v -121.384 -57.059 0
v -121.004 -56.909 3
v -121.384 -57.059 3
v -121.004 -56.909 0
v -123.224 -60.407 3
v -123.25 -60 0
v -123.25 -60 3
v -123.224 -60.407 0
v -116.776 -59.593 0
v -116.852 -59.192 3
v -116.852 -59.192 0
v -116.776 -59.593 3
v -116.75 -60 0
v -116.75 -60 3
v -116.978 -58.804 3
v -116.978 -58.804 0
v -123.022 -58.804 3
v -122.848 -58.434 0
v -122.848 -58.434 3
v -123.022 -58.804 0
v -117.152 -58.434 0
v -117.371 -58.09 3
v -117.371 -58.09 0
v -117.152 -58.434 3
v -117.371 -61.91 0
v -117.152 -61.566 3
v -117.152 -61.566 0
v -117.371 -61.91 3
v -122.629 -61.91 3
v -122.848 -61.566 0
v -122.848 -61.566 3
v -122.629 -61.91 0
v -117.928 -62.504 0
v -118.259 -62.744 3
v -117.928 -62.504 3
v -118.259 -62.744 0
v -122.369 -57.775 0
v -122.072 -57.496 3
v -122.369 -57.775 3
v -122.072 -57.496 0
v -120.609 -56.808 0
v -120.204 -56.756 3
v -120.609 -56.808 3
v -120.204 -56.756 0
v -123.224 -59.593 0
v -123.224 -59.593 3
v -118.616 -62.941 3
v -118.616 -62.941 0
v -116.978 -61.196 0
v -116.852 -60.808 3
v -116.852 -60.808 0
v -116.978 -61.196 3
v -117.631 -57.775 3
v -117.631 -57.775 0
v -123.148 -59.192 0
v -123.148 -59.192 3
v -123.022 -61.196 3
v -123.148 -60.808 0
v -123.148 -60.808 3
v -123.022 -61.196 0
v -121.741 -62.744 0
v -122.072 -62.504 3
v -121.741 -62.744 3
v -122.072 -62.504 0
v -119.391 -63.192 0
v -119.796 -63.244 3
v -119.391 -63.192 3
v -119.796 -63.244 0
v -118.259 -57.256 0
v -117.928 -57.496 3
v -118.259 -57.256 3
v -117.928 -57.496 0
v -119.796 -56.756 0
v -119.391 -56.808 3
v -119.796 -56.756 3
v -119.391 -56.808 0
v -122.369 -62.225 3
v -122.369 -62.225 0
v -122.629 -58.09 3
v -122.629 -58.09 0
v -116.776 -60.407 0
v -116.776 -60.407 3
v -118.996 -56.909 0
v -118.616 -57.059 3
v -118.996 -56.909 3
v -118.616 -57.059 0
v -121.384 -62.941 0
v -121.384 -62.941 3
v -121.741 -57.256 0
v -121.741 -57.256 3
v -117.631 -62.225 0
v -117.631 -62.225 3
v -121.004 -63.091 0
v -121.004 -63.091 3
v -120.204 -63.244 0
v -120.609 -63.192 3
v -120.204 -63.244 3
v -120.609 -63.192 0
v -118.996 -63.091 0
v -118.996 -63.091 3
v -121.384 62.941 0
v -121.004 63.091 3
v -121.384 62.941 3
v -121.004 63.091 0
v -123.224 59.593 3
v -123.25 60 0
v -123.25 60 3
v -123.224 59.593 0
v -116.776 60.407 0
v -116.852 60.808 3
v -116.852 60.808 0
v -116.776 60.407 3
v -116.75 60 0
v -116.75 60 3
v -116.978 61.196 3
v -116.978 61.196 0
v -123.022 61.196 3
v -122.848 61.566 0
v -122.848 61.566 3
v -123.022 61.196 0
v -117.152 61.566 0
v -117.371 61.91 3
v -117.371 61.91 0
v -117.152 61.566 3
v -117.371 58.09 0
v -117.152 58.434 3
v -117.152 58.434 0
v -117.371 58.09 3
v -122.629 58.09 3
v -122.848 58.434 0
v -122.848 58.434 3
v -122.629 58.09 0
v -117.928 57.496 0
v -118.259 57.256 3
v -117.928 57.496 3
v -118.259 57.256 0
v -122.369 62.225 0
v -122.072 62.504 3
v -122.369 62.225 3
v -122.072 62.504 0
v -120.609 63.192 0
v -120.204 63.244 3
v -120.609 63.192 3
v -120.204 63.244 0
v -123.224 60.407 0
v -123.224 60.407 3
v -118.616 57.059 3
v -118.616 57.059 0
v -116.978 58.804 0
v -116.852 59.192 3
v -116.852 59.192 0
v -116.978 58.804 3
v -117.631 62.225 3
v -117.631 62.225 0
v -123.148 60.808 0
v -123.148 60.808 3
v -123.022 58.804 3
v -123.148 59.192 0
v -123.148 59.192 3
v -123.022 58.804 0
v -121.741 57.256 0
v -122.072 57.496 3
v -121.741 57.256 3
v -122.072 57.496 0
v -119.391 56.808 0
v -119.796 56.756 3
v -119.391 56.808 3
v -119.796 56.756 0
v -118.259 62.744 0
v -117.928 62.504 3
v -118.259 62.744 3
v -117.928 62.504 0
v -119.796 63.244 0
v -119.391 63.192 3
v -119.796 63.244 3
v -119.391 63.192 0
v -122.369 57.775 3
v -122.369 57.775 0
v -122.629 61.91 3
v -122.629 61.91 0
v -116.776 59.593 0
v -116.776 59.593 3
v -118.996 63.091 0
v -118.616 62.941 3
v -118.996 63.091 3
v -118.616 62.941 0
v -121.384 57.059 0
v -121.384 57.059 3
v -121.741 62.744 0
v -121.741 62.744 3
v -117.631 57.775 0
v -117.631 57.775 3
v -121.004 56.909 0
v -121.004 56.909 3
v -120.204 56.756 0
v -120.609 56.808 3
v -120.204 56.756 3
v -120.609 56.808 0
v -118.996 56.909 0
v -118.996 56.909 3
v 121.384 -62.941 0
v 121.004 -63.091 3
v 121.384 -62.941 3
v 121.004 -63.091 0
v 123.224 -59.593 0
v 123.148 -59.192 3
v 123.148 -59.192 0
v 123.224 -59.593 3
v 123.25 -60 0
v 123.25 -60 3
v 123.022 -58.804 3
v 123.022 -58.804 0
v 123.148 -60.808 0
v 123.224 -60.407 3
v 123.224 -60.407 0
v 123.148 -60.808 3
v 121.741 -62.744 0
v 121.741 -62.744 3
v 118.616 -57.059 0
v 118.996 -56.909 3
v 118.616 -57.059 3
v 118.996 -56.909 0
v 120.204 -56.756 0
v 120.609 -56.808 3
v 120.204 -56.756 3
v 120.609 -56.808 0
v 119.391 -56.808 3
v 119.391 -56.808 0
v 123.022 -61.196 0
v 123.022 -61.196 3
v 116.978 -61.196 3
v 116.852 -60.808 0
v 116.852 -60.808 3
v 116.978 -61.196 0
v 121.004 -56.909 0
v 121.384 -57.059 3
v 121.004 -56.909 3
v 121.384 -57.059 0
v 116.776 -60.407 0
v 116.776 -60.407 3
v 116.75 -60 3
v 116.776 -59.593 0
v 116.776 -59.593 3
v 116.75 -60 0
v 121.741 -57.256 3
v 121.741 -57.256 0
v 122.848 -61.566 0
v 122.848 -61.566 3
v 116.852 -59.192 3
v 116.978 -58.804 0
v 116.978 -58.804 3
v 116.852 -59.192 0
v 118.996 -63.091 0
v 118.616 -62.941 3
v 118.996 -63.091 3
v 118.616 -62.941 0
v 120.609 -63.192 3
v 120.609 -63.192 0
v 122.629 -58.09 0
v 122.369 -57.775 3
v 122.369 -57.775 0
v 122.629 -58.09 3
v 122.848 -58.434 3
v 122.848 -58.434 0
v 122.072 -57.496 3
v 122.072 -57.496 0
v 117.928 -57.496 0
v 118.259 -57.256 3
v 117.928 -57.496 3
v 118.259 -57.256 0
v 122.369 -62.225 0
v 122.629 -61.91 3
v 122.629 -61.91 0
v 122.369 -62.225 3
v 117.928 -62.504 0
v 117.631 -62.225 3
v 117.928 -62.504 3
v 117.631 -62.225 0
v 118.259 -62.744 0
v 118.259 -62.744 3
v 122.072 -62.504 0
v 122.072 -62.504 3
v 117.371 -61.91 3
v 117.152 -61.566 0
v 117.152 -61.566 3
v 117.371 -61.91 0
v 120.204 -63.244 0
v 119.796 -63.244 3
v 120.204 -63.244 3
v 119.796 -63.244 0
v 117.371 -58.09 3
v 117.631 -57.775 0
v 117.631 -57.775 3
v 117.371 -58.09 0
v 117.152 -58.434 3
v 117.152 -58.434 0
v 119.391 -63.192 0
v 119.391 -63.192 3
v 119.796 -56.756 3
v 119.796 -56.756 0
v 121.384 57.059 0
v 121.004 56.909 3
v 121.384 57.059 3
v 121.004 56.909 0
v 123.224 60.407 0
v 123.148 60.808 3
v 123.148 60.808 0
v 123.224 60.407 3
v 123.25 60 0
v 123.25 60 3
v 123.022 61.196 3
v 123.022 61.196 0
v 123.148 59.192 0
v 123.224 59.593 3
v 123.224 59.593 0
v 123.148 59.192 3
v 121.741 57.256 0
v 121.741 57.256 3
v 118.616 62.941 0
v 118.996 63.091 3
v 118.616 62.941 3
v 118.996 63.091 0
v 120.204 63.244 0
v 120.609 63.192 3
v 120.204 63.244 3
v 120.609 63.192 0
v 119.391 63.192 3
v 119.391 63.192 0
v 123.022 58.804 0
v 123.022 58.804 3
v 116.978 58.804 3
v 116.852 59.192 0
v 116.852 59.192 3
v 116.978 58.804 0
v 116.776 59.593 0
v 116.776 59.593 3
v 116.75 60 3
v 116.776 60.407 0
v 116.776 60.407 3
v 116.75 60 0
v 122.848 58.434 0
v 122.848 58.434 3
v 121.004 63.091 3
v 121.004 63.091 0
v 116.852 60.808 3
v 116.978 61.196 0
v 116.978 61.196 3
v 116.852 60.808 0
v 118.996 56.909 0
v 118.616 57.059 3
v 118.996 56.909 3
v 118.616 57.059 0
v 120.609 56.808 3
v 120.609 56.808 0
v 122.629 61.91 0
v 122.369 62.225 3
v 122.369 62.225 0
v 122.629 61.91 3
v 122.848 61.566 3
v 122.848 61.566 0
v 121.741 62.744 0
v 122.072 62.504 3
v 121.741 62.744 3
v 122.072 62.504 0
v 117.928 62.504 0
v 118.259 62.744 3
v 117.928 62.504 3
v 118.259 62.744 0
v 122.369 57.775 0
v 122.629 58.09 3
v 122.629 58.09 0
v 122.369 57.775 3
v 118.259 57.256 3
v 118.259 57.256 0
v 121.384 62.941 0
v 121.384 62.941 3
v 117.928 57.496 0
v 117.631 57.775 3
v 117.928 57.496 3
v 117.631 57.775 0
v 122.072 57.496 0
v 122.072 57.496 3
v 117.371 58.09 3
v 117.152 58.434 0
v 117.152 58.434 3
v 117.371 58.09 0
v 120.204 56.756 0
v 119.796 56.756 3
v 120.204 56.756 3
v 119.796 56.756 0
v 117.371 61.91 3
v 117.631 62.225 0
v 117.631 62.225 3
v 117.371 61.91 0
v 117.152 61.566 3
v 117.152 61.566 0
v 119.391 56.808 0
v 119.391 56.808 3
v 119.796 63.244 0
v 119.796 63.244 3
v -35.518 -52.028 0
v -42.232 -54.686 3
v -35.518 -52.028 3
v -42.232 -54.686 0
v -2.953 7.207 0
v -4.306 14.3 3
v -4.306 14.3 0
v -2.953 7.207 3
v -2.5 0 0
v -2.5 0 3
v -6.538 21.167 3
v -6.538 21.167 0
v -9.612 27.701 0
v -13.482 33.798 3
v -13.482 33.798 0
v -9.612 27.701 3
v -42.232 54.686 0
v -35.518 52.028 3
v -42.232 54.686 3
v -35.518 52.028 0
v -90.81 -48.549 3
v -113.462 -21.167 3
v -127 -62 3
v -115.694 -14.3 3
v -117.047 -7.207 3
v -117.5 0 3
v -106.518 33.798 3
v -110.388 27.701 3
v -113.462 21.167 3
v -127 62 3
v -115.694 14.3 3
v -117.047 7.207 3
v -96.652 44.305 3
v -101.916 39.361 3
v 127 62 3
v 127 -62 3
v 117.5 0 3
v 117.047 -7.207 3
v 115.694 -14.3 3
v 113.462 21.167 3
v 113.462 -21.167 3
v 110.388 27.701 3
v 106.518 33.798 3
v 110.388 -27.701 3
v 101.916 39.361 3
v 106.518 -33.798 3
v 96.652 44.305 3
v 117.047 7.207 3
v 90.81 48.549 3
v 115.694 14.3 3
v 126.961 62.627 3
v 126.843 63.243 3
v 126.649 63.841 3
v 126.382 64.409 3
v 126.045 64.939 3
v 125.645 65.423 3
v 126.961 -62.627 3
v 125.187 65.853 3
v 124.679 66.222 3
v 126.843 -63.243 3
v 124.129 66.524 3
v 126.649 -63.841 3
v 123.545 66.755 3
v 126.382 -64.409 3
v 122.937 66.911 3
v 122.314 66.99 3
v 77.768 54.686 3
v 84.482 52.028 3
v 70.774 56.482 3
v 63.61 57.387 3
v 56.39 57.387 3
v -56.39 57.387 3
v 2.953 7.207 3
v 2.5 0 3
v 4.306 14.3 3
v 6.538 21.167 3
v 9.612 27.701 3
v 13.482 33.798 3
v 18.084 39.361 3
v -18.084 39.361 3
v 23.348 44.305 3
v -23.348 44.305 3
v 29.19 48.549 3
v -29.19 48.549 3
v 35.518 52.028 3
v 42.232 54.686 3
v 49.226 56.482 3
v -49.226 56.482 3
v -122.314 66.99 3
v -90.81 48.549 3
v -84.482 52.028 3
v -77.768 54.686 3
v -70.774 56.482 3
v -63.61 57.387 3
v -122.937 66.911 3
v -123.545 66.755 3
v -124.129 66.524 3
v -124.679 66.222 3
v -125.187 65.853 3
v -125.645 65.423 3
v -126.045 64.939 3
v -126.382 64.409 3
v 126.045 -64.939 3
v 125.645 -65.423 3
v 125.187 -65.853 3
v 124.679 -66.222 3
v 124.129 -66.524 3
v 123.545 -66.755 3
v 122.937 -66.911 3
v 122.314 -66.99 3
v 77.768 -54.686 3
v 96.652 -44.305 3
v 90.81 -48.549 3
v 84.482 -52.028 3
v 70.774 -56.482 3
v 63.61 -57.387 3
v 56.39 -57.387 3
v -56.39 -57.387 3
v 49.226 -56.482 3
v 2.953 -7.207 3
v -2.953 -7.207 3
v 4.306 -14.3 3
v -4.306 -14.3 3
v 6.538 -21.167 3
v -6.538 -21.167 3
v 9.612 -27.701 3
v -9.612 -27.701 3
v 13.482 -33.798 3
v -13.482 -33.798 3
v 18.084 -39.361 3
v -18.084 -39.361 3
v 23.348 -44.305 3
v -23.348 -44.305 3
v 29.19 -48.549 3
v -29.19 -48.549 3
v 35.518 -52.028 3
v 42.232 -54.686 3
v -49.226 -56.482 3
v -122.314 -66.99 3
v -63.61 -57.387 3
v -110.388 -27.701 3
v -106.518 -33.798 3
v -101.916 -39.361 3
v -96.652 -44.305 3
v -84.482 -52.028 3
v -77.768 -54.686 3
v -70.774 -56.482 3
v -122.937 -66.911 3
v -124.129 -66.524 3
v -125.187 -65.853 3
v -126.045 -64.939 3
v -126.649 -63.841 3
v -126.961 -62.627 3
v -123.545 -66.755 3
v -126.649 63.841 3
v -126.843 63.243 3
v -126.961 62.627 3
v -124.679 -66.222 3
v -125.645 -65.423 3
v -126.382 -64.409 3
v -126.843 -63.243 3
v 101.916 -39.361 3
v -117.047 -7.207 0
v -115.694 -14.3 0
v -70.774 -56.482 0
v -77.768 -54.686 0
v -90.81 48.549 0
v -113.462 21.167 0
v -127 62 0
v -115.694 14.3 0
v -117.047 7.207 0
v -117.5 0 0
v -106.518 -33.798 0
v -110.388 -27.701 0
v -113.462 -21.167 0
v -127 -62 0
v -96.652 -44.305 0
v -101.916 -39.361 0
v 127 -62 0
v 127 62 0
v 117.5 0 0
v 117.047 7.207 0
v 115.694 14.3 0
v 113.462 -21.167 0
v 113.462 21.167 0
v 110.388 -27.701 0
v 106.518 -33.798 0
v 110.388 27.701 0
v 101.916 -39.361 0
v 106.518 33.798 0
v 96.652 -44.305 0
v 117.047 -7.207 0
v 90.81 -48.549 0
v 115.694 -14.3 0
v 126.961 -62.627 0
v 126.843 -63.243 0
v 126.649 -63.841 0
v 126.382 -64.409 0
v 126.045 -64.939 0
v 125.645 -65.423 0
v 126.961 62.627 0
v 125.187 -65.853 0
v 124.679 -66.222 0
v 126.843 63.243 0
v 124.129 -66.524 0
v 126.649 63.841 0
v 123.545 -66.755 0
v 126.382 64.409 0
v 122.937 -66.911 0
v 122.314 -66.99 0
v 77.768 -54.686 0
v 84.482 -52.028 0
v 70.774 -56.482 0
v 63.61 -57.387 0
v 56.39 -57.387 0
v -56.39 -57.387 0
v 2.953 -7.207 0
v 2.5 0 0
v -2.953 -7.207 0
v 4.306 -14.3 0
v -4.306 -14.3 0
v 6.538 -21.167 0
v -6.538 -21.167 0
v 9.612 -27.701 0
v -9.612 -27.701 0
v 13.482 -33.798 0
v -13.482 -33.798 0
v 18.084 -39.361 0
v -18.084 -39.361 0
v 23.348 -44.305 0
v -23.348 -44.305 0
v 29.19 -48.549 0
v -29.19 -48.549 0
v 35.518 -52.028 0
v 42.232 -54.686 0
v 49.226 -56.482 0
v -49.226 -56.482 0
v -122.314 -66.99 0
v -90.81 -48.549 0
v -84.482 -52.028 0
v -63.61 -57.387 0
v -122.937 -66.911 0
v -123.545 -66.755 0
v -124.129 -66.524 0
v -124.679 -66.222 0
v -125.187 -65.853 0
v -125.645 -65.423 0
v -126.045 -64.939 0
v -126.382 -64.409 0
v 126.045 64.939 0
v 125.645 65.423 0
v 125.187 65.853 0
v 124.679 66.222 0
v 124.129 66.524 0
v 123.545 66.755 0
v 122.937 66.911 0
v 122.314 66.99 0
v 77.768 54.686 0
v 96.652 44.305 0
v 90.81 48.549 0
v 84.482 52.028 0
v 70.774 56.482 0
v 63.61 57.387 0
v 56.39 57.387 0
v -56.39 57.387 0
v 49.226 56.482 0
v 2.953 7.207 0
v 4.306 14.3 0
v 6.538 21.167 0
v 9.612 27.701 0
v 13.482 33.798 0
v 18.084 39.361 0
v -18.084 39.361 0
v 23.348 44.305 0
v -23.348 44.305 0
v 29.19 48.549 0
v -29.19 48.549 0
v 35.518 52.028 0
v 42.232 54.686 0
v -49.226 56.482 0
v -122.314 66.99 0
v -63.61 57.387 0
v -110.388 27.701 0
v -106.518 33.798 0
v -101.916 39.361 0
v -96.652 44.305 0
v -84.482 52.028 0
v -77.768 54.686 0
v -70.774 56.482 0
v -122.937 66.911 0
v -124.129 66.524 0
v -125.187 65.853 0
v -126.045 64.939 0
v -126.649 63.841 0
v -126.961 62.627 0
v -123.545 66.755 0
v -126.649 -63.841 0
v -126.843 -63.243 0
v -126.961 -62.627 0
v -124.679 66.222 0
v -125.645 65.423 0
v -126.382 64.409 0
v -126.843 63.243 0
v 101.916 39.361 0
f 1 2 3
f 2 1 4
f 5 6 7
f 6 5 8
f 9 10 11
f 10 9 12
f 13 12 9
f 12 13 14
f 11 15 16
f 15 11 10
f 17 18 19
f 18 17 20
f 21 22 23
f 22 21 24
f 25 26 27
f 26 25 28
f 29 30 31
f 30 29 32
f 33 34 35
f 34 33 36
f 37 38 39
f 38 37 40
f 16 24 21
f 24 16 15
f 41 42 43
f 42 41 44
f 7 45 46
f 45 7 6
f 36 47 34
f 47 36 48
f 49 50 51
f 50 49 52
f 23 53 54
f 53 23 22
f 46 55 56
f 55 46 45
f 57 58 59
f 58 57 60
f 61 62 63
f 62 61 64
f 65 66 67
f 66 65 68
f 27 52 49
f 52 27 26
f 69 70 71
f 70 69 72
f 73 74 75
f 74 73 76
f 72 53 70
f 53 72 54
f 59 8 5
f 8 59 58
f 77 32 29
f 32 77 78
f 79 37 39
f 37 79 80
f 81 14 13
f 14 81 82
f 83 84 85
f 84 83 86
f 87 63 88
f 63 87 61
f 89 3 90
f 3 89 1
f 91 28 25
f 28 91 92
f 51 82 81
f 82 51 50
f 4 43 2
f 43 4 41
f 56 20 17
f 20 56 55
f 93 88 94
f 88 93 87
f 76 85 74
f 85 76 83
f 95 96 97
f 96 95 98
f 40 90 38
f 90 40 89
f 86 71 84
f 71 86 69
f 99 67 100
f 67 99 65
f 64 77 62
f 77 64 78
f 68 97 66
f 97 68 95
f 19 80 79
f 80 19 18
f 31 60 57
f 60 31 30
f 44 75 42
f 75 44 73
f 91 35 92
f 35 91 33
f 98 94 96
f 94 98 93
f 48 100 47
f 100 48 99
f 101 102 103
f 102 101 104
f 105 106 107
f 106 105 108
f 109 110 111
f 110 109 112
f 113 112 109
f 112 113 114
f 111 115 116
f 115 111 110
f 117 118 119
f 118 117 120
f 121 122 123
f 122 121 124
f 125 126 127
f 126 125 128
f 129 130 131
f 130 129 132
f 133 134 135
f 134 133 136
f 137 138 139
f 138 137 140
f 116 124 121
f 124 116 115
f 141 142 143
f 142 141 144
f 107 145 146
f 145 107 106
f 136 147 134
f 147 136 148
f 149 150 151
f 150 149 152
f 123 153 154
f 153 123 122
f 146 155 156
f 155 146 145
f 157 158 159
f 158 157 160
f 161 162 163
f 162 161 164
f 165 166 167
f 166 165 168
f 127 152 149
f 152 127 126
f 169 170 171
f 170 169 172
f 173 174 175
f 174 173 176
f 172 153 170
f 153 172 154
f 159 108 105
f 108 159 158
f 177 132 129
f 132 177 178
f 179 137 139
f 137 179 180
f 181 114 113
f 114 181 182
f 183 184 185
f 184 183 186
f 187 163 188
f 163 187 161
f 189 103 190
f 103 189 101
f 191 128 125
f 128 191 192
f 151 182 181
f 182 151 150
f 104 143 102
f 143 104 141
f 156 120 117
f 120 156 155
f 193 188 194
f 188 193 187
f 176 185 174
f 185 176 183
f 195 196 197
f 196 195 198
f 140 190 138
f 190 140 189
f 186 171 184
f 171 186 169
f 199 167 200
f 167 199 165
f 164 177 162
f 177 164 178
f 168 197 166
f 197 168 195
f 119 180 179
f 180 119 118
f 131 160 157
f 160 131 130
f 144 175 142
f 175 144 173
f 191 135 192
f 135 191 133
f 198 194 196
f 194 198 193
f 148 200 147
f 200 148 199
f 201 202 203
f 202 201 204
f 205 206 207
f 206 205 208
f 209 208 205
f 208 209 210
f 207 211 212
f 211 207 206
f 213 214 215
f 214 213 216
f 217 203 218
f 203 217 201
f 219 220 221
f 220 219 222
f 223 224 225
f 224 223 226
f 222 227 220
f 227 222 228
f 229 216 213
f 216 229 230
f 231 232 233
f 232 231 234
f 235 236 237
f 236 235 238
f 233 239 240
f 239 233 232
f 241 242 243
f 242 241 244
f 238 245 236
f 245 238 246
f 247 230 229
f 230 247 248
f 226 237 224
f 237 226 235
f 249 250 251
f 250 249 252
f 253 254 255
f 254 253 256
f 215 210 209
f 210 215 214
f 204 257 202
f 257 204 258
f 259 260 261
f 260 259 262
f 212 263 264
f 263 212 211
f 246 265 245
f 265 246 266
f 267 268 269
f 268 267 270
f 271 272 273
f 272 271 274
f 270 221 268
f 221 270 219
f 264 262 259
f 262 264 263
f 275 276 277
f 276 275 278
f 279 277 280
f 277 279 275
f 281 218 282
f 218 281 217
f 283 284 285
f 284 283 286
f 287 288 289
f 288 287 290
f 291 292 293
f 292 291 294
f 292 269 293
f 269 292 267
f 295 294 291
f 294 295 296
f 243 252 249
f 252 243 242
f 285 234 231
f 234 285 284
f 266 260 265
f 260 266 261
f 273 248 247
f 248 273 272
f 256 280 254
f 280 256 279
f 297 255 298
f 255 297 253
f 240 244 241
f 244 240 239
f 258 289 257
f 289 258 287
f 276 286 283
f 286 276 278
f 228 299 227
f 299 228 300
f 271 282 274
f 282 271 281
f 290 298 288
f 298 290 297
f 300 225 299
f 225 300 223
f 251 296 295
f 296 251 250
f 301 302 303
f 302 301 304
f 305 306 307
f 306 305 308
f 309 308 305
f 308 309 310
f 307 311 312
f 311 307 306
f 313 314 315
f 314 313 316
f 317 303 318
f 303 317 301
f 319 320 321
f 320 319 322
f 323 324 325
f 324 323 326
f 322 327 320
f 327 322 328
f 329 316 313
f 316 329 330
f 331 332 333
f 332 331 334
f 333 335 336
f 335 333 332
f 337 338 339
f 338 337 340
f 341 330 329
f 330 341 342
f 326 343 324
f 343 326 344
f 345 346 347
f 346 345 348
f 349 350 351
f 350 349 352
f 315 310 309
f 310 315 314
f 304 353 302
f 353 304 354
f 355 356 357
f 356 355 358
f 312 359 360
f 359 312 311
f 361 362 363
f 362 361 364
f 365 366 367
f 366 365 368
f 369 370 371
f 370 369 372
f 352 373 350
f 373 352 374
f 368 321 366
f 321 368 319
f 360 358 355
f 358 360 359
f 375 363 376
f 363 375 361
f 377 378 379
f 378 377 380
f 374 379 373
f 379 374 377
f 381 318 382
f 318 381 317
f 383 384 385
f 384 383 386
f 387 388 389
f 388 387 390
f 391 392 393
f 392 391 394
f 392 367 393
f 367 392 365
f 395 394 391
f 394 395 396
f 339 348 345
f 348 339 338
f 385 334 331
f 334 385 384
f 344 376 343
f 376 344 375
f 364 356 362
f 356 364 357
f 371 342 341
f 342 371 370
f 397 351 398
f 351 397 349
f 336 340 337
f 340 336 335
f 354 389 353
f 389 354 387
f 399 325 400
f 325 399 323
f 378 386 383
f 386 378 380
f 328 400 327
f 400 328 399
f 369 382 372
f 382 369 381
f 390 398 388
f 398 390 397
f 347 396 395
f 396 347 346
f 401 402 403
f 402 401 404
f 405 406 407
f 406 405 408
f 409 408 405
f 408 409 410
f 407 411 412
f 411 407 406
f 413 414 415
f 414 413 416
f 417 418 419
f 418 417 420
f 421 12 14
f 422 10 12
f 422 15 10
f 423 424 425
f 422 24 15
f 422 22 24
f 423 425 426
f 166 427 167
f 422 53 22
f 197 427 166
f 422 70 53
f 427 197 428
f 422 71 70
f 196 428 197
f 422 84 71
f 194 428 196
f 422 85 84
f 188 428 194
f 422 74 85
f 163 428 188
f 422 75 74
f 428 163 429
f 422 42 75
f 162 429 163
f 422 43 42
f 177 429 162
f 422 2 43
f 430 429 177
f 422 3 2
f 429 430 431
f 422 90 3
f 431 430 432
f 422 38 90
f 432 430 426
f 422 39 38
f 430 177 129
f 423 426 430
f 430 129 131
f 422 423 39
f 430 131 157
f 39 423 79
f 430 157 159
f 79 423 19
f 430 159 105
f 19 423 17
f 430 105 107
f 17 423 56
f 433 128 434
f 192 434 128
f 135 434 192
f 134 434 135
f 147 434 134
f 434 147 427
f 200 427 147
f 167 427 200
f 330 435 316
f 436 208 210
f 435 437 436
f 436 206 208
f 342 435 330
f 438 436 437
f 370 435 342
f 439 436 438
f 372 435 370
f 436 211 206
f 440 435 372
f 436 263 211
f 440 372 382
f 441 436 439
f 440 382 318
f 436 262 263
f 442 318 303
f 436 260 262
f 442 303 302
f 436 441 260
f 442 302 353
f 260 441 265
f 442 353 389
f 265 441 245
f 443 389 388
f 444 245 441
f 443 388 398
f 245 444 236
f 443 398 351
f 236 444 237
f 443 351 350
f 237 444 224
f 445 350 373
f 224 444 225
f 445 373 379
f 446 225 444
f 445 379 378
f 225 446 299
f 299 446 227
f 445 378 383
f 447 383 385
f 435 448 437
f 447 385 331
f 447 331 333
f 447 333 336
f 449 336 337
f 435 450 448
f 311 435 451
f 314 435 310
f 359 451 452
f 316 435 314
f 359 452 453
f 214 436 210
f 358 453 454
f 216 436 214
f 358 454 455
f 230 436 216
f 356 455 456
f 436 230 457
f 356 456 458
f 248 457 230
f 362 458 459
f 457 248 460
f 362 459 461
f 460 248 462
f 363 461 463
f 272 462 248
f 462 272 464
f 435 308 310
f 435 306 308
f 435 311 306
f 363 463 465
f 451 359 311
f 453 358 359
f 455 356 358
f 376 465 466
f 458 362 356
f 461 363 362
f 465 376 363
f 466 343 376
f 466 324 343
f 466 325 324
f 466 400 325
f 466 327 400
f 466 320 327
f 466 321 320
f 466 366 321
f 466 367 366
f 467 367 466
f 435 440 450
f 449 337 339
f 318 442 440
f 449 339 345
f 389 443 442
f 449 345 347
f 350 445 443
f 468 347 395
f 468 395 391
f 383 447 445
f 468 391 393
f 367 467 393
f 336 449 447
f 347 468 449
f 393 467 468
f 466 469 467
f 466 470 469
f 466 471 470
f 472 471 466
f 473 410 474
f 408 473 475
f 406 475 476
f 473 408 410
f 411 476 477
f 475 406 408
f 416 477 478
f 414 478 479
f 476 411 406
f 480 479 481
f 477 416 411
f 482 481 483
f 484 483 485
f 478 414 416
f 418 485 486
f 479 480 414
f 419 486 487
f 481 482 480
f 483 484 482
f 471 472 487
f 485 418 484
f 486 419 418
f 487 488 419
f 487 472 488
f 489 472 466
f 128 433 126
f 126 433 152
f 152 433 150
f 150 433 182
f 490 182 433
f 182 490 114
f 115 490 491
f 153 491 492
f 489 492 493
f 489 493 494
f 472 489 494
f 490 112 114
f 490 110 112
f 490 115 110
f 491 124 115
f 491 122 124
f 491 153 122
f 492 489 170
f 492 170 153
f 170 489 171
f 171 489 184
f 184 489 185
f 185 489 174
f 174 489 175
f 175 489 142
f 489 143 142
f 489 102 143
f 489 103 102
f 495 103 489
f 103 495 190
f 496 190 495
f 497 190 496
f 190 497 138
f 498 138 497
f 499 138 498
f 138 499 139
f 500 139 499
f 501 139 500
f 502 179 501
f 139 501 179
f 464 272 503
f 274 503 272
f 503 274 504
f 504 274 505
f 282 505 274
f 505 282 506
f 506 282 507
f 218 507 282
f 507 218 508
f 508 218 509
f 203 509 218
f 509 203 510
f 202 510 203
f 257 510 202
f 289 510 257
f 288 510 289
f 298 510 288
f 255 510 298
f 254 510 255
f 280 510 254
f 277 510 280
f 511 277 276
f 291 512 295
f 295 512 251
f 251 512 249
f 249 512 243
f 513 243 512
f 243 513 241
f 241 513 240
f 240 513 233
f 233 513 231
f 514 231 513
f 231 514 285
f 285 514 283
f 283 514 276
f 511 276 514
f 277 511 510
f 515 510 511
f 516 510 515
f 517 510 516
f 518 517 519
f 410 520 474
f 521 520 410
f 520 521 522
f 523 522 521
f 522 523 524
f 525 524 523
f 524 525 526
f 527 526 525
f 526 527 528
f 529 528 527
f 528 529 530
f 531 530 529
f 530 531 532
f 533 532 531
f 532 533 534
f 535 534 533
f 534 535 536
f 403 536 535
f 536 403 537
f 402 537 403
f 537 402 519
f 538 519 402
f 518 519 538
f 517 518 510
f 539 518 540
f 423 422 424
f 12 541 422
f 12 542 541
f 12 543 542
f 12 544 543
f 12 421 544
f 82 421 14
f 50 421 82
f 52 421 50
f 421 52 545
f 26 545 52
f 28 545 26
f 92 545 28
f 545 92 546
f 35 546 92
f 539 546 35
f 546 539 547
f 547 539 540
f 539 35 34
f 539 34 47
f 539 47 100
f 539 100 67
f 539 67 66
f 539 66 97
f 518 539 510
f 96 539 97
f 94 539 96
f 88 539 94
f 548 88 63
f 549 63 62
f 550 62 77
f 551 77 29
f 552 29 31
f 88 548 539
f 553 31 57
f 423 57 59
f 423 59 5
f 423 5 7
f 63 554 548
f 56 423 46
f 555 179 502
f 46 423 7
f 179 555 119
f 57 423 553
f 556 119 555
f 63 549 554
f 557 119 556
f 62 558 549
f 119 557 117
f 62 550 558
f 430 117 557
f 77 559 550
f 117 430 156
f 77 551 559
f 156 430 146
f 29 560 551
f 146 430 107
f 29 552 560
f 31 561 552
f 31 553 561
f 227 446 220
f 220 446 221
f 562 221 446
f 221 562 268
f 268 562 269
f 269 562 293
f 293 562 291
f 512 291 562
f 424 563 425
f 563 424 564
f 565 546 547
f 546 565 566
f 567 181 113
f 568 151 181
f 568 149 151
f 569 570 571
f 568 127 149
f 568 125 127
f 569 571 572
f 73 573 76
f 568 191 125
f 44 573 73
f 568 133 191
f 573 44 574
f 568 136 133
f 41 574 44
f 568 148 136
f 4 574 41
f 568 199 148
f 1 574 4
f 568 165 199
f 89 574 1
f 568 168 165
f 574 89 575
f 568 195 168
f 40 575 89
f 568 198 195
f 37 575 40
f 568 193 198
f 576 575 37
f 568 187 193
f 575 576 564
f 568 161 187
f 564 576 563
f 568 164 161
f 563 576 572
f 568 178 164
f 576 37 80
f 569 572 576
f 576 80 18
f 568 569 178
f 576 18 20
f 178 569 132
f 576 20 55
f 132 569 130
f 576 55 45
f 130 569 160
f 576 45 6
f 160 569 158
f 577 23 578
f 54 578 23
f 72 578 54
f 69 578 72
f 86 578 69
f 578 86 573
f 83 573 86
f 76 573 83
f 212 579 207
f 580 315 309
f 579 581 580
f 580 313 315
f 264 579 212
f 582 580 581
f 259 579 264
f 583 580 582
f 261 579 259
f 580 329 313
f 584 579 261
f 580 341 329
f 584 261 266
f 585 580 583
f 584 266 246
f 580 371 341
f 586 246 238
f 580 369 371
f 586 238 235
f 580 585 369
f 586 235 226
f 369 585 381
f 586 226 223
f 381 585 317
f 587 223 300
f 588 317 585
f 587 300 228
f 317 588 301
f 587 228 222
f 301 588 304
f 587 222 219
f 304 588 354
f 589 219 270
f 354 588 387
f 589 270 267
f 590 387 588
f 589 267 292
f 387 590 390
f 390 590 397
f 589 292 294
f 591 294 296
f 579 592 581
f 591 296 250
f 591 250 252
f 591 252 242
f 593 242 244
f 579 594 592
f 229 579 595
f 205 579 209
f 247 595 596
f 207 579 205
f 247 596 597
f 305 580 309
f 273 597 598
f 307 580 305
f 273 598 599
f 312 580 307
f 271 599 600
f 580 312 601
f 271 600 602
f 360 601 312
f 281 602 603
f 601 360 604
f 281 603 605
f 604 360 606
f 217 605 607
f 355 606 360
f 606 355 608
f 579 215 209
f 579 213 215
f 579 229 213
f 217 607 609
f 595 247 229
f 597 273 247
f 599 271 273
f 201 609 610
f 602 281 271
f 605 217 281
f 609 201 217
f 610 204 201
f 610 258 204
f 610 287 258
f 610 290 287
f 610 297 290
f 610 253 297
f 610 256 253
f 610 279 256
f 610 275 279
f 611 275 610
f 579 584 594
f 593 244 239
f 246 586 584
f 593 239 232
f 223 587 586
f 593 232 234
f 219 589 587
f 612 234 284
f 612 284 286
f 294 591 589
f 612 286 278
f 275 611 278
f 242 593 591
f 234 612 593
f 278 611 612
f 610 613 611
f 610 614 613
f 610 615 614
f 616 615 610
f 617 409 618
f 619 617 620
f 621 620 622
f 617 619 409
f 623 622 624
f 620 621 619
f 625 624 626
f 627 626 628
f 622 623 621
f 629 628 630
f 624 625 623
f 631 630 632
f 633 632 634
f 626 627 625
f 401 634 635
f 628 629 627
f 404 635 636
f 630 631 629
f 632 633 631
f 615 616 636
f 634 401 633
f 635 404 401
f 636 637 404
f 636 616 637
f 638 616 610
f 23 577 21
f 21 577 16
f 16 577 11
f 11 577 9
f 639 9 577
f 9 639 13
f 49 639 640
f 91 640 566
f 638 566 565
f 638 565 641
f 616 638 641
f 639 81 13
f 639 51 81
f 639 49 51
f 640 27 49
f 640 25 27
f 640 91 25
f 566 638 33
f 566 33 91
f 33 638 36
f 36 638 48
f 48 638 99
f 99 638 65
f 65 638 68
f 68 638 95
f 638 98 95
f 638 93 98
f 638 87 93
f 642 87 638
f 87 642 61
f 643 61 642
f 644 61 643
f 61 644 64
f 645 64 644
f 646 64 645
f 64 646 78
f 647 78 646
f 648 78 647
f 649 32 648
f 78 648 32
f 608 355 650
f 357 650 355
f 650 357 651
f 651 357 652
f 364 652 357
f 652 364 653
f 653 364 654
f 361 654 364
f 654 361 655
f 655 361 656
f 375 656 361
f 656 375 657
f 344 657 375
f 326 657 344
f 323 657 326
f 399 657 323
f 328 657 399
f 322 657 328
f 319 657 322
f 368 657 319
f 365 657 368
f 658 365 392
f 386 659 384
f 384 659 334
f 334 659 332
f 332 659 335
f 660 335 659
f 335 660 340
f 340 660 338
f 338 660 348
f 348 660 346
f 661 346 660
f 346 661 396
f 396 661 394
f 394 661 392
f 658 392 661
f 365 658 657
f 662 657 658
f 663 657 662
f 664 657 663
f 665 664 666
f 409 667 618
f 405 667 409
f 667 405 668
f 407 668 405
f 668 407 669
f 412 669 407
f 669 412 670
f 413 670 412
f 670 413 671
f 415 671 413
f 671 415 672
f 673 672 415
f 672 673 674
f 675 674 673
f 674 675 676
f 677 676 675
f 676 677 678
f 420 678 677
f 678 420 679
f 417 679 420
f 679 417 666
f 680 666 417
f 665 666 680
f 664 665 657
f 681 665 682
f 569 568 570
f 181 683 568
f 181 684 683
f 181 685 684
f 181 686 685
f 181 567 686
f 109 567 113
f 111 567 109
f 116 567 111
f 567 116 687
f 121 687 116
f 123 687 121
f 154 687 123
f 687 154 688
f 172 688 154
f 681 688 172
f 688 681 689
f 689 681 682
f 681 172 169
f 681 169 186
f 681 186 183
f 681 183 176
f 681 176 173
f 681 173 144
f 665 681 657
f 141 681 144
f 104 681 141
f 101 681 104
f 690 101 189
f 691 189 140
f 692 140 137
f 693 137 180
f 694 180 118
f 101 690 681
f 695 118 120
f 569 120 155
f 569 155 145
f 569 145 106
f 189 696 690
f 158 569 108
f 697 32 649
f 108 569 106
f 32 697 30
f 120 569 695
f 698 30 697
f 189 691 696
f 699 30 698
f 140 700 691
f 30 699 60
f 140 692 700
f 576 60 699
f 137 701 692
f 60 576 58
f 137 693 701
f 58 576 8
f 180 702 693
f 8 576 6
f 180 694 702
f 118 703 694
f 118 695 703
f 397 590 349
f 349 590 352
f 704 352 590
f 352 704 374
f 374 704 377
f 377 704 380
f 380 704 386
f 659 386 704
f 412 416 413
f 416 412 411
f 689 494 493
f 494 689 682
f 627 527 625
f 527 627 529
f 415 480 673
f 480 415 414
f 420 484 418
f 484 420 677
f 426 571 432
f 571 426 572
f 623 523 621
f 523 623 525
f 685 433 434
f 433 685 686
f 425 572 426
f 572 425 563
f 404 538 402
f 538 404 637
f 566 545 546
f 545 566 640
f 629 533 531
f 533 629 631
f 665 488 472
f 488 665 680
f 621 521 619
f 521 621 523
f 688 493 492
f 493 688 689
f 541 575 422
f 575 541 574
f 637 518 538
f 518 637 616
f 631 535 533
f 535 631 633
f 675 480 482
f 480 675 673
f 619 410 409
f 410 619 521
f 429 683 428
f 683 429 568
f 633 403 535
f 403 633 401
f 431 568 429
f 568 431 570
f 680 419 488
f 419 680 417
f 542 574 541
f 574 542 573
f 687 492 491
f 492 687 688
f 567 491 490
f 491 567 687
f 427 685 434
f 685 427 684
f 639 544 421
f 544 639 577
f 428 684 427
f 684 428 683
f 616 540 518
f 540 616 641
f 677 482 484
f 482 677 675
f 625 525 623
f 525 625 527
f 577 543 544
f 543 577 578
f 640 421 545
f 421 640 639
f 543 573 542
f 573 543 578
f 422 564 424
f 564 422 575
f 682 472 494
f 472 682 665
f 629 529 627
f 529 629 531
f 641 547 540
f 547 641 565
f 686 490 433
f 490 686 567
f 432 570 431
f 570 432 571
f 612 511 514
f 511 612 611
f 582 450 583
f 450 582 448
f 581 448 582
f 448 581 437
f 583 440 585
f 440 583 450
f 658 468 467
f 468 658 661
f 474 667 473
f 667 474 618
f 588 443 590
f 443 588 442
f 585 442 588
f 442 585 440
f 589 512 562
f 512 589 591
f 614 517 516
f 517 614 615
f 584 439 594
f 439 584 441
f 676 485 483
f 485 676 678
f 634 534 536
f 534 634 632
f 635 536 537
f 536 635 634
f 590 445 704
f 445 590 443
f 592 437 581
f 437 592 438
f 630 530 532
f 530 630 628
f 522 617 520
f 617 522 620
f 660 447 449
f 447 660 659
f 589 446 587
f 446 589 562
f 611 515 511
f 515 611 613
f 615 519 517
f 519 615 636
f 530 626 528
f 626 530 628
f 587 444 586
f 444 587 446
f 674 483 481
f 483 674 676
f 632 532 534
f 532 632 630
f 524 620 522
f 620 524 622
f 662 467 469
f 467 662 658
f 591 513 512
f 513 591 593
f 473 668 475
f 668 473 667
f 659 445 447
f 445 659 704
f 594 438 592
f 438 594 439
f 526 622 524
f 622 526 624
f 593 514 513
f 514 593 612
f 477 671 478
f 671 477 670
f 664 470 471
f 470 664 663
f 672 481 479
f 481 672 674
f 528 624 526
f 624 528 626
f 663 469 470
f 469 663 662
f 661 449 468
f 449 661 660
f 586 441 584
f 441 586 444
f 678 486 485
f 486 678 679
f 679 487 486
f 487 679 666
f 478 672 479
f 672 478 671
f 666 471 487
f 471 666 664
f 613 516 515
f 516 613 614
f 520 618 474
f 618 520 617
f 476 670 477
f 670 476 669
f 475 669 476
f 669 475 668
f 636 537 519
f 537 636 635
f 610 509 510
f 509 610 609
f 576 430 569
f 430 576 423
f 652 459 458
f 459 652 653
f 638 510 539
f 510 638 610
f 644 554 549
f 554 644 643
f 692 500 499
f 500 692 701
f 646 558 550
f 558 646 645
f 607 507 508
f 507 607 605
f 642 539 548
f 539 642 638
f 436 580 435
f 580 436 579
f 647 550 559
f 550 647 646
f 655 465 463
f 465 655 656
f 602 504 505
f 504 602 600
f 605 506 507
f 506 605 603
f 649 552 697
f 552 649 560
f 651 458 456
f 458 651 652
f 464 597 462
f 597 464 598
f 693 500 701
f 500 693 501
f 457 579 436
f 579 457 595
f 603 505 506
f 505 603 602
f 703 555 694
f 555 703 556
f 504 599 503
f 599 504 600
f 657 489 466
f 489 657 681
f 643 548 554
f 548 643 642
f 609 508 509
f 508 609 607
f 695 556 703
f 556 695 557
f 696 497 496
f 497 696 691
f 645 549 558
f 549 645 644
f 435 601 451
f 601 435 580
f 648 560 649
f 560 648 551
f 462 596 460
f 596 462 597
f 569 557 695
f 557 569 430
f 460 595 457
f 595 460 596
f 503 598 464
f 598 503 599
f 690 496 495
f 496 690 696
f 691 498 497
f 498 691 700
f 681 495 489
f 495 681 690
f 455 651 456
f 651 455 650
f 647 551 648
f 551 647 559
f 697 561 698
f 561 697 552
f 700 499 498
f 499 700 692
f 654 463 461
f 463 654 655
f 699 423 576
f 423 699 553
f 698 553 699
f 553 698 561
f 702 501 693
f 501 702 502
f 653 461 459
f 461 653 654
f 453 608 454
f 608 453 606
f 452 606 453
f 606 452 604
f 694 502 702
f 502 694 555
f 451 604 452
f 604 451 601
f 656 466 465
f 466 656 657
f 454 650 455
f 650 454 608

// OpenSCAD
$fn = 50;


difference() {
	union() {
		hull() {
			translate(v = [-122.0000000000, 62.0000000000, 0]) {
				cylinder(h = 3, r = 5);
			}
			translate(v = [122.0000000000, 62.0000000000, 0]) {
				cylinder(h = 3, r = 5);
			}
			translate(v = [-122.0000000000, -62.0000000000, 0]) {
				cylinder(h = 3, r = 5);
			}
			translate(v = [122.0000000000, -62.0000000000, 0]) {
				cylinder(h = 3, r = 5);
			}
		}
	}
	union() {
		#translate(v = [-120.0000000000, -60.0000000000, -100.0000000000]) {
			cylinder(h = 200, r = 3.2500000000);
		}
		#translate(v = [-120.0000000000, 60.0000000000, -100.0000000000]) {
			cylinder(h = 200, r = 3.2500000000);
		}
		#translate(v = [120.0000000000, -60.0000000000, -100.0000000000]) {
			cylinder(h = 200, r = 3.2500000000);
		}
		#translate(v = [120.0000000000, 60.0000000000, -100.0000000000]) {
			cylinder(h = 200, r = 3.2500000000);
		}
		#translate(v = [-60.0000000000, 0, 0]) {
			cylinder(h = 3, r = 57.5000000000);
		}
		#translate(v = [60.0000000000, 0, 0]) {
			cylinder(h = 3, r = 57.5000000000);
		}
	}
}
